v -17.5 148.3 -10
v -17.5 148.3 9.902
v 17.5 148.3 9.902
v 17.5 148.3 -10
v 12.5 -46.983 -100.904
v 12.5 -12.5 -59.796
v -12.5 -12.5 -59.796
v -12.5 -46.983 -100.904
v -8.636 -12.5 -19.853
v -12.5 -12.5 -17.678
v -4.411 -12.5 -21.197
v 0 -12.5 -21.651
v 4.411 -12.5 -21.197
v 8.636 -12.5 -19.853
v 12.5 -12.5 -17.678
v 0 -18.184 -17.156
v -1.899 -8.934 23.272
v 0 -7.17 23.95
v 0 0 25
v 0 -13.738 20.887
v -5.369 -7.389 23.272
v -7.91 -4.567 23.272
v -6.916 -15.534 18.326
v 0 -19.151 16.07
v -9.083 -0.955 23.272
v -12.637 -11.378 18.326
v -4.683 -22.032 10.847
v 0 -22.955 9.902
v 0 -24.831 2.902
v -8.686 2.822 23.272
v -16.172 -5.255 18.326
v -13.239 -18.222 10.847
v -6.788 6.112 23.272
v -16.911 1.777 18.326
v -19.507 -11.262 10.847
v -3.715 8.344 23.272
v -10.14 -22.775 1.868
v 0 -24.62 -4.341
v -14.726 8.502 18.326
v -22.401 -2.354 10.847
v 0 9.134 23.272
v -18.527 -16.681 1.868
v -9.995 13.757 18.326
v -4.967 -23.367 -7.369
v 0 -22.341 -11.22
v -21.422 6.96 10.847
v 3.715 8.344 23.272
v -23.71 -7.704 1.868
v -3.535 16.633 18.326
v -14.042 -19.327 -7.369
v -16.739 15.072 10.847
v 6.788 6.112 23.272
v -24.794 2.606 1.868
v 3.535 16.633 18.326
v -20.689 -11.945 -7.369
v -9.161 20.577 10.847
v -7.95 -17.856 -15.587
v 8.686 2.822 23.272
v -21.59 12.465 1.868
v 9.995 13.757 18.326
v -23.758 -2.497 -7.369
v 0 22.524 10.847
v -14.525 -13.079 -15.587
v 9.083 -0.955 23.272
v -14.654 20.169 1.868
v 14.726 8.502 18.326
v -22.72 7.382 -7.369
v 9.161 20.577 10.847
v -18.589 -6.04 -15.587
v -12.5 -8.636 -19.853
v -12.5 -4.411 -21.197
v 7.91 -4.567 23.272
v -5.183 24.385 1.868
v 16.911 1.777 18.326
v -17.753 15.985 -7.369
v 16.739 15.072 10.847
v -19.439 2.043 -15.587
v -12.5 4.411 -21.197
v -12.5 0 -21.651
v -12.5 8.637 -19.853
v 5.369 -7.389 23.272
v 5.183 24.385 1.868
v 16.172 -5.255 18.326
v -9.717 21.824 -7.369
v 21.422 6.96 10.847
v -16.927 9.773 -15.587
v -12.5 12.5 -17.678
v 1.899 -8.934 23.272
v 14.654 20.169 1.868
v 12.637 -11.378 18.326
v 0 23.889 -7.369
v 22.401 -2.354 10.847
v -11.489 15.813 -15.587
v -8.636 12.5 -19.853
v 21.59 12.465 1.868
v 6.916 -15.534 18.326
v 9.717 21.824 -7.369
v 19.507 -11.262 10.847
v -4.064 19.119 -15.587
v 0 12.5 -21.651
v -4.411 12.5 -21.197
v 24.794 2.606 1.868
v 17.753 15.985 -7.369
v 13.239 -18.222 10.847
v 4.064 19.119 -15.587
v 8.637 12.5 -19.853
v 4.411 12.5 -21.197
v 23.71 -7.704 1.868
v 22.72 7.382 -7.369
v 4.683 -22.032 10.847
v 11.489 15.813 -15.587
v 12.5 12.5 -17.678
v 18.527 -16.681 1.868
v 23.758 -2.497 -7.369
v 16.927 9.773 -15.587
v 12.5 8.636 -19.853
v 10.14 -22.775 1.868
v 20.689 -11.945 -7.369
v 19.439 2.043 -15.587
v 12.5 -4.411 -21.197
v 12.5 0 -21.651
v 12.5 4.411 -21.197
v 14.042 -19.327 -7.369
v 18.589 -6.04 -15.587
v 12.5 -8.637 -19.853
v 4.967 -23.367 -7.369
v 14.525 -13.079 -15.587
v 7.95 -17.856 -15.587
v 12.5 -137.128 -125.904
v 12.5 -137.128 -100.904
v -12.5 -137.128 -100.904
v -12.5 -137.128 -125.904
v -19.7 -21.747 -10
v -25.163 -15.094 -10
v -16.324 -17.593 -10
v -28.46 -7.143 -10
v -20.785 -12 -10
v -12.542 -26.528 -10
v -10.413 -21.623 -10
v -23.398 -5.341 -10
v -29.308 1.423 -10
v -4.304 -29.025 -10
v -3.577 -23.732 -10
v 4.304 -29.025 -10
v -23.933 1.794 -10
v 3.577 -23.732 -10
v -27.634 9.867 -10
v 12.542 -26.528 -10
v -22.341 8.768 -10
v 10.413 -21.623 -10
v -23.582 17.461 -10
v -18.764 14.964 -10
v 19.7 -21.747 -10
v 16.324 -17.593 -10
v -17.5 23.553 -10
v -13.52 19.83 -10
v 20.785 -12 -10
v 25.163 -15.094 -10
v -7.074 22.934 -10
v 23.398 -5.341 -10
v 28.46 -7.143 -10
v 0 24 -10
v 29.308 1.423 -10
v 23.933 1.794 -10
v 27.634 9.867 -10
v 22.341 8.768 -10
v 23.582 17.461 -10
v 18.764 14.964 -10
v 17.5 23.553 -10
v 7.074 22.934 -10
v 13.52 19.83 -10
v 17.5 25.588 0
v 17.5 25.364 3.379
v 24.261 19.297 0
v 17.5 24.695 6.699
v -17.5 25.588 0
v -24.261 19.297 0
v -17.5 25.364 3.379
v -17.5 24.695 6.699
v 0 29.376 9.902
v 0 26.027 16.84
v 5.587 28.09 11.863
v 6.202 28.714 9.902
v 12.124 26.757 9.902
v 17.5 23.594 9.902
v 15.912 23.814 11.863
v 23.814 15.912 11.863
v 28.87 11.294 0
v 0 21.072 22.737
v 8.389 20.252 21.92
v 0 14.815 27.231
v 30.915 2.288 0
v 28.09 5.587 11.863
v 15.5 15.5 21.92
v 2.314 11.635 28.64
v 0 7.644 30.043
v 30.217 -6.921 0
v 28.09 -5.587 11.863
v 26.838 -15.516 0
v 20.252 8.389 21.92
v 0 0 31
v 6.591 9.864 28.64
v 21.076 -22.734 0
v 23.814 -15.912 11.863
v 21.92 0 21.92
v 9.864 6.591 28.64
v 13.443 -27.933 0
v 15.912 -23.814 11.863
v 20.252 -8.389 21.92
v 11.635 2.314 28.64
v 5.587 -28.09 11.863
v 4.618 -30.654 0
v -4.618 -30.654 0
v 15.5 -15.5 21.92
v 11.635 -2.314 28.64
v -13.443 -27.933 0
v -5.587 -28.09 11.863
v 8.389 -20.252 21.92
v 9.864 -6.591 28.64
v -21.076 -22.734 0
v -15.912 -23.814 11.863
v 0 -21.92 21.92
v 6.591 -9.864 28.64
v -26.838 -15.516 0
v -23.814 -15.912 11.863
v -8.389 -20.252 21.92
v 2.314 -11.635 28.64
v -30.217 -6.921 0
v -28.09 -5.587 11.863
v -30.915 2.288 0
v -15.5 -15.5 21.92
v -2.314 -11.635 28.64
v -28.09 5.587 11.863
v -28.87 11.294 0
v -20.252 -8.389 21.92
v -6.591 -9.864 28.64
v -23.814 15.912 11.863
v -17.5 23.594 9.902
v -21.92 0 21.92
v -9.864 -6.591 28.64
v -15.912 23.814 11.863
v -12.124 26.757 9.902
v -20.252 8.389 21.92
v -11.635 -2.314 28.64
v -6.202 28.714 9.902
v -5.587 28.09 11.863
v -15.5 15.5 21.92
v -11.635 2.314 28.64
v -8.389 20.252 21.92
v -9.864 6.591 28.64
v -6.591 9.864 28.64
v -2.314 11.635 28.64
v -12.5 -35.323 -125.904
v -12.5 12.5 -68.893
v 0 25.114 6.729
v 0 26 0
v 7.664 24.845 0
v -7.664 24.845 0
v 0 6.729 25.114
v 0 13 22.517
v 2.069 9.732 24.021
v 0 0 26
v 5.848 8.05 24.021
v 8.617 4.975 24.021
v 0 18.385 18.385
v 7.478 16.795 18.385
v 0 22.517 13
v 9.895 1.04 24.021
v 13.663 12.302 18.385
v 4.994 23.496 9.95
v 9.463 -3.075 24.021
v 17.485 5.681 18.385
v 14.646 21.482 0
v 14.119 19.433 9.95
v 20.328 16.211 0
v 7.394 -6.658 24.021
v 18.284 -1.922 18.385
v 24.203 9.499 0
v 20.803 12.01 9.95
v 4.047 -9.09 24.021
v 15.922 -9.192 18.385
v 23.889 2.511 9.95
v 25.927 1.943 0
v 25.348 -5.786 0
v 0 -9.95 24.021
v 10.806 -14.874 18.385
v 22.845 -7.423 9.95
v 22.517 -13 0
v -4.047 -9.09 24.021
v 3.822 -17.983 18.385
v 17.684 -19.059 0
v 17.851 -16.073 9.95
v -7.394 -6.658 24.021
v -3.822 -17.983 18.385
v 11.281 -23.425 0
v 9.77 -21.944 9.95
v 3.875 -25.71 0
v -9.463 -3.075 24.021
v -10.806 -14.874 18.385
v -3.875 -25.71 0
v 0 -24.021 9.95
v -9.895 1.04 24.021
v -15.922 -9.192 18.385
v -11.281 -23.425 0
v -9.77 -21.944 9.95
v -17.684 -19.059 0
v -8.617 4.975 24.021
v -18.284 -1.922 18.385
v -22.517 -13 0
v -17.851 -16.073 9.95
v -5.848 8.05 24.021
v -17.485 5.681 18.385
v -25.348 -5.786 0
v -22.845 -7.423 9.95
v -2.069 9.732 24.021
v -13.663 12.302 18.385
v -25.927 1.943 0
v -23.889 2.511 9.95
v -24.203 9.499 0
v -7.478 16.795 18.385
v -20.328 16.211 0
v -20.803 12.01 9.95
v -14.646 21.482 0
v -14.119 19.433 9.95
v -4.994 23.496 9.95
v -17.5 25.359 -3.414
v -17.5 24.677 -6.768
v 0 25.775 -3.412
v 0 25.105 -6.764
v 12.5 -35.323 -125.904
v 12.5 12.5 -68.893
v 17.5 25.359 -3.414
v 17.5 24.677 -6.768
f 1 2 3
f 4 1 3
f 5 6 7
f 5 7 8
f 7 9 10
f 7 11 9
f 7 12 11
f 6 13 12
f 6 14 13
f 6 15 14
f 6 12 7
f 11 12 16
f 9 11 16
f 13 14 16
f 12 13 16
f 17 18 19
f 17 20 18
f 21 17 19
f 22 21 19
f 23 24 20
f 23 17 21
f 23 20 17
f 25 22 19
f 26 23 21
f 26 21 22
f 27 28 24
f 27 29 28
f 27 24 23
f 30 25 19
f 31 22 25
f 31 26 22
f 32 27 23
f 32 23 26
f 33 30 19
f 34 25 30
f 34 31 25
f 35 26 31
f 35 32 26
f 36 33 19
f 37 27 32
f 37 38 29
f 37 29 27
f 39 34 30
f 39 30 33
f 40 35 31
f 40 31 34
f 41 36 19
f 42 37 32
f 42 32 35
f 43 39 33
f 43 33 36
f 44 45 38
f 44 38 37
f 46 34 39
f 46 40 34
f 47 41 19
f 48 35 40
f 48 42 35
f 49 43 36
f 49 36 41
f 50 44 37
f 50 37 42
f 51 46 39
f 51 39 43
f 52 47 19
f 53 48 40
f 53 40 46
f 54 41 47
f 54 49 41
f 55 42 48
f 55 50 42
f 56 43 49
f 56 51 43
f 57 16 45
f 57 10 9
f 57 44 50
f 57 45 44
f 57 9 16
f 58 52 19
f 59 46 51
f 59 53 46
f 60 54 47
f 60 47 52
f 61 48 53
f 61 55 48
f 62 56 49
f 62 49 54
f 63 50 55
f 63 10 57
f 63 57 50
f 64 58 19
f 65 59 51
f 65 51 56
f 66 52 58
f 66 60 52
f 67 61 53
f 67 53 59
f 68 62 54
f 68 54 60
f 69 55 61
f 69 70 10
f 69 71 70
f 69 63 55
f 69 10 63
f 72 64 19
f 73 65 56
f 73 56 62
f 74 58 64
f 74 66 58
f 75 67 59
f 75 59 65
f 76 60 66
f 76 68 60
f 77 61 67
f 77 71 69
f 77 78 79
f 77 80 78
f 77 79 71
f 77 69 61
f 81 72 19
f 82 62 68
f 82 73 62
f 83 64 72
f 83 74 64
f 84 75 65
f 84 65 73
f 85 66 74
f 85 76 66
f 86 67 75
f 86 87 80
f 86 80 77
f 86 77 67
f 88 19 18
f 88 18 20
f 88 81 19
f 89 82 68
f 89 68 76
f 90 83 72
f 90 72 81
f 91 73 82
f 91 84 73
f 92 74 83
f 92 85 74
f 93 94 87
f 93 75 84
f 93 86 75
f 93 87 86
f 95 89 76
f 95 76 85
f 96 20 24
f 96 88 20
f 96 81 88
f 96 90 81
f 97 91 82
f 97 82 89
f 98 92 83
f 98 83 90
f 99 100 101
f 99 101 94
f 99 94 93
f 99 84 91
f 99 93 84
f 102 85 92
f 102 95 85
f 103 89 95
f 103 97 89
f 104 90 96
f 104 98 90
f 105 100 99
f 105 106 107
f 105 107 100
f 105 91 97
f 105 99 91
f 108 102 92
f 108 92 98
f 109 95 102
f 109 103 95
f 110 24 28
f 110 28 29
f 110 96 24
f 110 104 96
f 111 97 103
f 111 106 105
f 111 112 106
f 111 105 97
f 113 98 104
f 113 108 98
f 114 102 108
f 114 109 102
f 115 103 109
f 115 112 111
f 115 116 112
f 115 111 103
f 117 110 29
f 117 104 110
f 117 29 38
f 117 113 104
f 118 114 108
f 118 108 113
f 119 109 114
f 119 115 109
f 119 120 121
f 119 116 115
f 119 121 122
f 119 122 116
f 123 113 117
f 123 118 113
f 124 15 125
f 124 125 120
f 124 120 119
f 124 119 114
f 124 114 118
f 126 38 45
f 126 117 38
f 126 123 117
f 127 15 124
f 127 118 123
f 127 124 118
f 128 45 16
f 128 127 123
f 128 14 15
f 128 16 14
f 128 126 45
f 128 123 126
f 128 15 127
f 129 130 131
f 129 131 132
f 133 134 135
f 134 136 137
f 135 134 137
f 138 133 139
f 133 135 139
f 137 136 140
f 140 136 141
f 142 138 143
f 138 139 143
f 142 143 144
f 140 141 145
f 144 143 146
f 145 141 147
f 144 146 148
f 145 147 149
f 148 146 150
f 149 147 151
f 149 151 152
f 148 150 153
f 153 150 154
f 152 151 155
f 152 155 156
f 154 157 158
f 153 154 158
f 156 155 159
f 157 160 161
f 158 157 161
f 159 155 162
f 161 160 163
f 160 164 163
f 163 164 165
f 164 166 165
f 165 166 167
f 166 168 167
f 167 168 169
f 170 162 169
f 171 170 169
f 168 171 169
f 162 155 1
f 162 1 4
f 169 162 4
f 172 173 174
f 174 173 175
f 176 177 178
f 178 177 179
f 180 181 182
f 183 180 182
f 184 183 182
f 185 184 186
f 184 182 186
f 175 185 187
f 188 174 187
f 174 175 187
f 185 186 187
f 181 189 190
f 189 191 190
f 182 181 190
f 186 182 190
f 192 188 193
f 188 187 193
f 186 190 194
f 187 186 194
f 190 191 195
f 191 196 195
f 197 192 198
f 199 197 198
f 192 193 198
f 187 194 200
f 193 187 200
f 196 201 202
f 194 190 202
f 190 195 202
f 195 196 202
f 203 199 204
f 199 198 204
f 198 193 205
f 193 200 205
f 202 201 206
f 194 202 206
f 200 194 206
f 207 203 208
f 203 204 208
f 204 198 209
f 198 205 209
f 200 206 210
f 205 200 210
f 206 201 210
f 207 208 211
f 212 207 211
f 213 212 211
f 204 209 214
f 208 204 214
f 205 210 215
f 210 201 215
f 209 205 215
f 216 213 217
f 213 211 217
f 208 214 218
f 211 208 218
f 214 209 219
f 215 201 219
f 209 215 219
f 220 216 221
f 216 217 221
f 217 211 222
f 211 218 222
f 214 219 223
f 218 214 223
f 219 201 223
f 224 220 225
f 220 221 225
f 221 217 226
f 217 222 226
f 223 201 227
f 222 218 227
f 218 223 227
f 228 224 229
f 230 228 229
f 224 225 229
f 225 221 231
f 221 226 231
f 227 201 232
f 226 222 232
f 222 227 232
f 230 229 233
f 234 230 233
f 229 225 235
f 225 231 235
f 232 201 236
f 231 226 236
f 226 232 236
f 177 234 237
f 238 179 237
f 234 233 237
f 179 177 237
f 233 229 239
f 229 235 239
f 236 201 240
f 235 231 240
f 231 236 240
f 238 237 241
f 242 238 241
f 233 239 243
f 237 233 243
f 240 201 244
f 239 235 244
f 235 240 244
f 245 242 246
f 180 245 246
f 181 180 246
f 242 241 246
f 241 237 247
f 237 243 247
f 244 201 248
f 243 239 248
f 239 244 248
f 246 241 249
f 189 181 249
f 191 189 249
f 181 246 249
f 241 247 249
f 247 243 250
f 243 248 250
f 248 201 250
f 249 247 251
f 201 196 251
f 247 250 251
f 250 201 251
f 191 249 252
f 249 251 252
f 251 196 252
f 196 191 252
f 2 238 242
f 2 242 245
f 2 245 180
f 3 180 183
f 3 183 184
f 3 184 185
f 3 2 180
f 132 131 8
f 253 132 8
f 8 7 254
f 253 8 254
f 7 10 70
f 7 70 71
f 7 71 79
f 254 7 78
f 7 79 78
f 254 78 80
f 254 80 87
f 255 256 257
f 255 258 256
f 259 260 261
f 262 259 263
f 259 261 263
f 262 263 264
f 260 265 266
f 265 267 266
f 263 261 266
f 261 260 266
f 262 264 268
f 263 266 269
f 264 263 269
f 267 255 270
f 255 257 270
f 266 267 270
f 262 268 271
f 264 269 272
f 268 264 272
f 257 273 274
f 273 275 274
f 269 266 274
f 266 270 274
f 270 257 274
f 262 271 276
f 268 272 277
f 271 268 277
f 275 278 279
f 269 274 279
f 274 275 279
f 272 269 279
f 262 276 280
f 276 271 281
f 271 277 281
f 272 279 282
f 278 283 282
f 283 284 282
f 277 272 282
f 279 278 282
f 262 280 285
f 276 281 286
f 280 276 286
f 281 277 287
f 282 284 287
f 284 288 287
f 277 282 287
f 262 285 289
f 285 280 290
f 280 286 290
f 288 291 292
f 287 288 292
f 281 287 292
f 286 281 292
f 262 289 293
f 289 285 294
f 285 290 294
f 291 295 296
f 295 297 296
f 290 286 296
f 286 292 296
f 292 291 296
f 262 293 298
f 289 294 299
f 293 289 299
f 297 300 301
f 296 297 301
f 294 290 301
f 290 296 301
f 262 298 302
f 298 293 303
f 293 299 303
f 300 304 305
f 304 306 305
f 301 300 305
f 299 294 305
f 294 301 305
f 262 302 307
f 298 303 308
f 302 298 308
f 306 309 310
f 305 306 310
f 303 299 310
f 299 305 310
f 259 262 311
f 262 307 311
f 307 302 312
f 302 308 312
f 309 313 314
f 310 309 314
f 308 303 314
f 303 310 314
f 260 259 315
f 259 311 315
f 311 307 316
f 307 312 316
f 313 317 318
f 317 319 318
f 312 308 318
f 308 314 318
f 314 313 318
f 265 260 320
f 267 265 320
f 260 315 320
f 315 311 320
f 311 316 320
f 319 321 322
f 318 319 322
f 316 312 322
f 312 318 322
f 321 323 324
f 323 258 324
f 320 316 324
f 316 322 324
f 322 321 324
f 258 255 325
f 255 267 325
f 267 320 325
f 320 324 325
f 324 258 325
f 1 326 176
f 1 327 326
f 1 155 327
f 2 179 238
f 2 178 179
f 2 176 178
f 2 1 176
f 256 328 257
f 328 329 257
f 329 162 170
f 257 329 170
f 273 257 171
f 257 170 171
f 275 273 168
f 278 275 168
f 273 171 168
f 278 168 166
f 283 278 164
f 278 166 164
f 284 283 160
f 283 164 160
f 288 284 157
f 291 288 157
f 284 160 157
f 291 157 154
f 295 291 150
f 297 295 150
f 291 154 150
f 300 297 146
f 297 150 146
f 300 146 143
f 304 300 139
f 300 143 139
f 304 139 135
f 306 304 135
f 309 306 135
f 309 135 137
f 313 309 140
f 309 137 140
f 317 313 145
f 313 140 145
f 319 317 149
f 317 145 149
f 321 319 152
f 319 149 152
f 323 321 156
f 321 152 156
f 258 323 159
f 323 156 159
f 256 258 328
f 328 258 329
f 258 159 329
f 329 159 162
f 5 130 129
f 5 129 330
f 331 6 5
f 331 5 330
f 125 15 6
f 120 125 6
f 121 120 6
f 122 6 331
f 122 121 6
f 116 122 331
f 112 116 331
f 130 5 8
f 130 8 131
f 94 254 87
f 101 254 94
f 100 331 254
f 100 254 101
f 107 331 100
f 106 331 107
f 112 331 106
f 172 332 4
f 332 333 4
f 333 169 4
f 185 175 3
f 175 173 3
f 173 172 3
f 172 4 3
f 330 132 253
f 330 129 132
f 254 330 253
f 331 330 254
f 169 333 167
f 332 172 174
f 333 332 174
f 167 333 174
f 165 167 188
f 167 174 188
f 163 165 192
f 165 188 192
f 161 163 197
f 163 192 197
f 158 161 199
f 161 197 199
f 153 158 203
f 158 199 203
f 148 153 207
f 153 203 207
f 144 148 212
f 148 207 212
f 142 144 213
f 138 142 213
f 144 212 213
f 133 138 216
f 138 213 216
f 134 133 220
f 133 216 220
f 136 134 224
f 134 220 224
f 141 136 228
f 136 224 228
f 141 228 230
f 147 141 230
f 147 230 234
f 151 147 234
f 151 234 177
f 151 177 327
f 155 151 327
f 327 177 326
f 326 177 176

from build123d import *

# Parameters (mm, degrees)
F2_DEPTH = 12.5
F5_W     = 35
F5_H     = 19.9022677168


with BuildPart() as f1:
    # F0 (on Right) → F1 (revolve)
    with BuildSketch(Plane.YZ):
        with BuildLine():
            Line((0, -9.0290624648), (0, 25))
            ThreePointArc((0, 25), (-24.1481456572, 6.4704761276), (-12.5, -21.6506350946))
            Line((-12.5, -21.6506350946), (-12.5, -9.0290624648))
            Line((-12.5, -9.0290624648), (0, -9.0290624648))
        make_face()
        with BuildLine():
            ThreePointArc((-12.5, -21.6506350946), (-6.4704761276, -24.1481456572), (0, -25))
            Line((0, -25), (0, -9.0290624648))
            Line((0, -9.0290624648), (-12.5, -9.0290624648))
            Line((-12.5, -9.0290624648), (-12.5, -21.6506350946))
        make_face()
    revolve(axis=Axis((0, 0, 0), (0, 0, -1)))

    # F0 (on Right) → F2 (join, symmetric)
    with BuildSketch(Plane.YZ):
        with BuildLine():
            Line((12.5, -68.8932172369), (12.5, -28.368115905))
            ThreePointArc((12.5, -28.368115905), (6.3870340122, -30.3348940418), (0, -31))
            ThreePointArc((0, -31), (-6.3870340122, -30.3348940418), (-12.5, -28.368115905))
            Line((-12.5, -28.368115905), (-12.5, -59.7960000712))
            Line((-12.5, -59.7960000712), (-46.9832708318, -100.9035838498))
            Line((-46.9832708318, -100.9035838498), (-137.1278739958, -100.9035838498))
            Line((-137.1278739958, -100.9035838498), (-137.1278739958, -125.9035838498))
            Line((-137.1278739958, -125.9035838498), (-35.3233875949, -125.9035838498))
            Line((-35.3233875949, -125.9035838498), (12.5, -68.8932172369))
        make_face()
        with BuildLine():
            Line((12.5, -28.368115905), (12.5, -22.7980262304))
            ThreePointArc((12.5, -22.7980262304), (6.451795022, -25.1867890172), (0, -26))
            Line((0, -26), (0, -31))
            ThreePointArc((0, -31), (6.3870340122, -30.3348940418), (12.5, -28.368115905))
        make_face()
        with BuildLine():
            Line((0, -31), (0, -26))
            ThreePointArc((0, -26), (-6.451795022, -25.1867890172), (-12.5, -22.7980262304))
            Line((-12.5, -22.7980262304), (-12.5, -28.368115905))
            ThreePointArc((-12.5, -28.368115905), (-6.3870340122, -30.3348940418), (0, -31))
        make_face()
        with BuildLine():
            Line((0, -26), (0, -25))
            ThreePointArc((0, -25), (-6.4704761276, -24.1481456572), (-12.5, -21.6506350946))
            Line((-12.5, -21.6506350946), (-12.5, -22.7980262304))
            ThreePointArc((-12.5, -22.7980262304), (-6.451795022, -25.1867890172), (0, -26))
        make_face()
        with BuildLine():
            ThreePointArc((-12.5, -21.6506350946), (-6.4704761276, -24.1481456572), (0, -25))
            Line((0, -25), (0, -9.0290624648))
            Line((0, -9.0290624648), (-12.5, -9.0290624648))
            Line((-12.5, -9.0290624648), (-12.5, -21.6506350946))
        make_face()
        with BuildLine():
            ThreePointArc((0, -25), (6.4704761276, -24.1481456572), (12.5, -21.6506350946))
            Line((12.5, -21.6506350946), (12.5, -9.0290624648))
            Line((12.5, -9.0290624648), (0, -9.0290624648))
            Line((0, -9.0290624648), (0, -25))
        make_face()
        with BuildLine():
            Line((12.5, -22.7980262304), (12.5, -21.6506350946))
            ThreePointArc((12.5, -21.6506350946), (6.4704761276, -24.1481456572), (0, -25))
            Line((0, -25), (0, -26))
            ThreePointArc((0, -26), (6.451795022, -25.1867890172), (12.5, -22.7980262304))
        make_face()
    extrude(amount=F2_DEPTH, both=True)


with BuildPart() as f3:
    # F0 (on Right) → F3 (revolve)
    with BuildSketch(Plane.YZ):
        with BuildLine():
            ThreePointArc((26, 0), (25.495097568, -5.0990195136), (24, -10))
            Line((24, -10), (29.3428015022, -10))
            ThreePointArc((29.3428015022, -10), (30.5828942921, -5.0681926478), (31, 0))
            ThreePointArc((31, 0), (21.9203102168, 21.9203102168), (0, 31))
            Line((0, 31), (0, 26))
            ThreePointArc((0, 26), (18.3847763109, 18.3847763109), (26, 0))
        make_face()
    revolve(axis=Axis((0, 0, 0), (0, 0, -1)))

    # F5 (on offset) → F6 (join, up to the next surface of F3)
    with BuildSketch(Plane.XZ.offset(-148.3)):
        with Locations((0, -0.0488661416)):
            Rectangle(F5_W, F5_H)
    extrude(until=Until.NEXT)


solid = Compound([f1.part, f3.part])
